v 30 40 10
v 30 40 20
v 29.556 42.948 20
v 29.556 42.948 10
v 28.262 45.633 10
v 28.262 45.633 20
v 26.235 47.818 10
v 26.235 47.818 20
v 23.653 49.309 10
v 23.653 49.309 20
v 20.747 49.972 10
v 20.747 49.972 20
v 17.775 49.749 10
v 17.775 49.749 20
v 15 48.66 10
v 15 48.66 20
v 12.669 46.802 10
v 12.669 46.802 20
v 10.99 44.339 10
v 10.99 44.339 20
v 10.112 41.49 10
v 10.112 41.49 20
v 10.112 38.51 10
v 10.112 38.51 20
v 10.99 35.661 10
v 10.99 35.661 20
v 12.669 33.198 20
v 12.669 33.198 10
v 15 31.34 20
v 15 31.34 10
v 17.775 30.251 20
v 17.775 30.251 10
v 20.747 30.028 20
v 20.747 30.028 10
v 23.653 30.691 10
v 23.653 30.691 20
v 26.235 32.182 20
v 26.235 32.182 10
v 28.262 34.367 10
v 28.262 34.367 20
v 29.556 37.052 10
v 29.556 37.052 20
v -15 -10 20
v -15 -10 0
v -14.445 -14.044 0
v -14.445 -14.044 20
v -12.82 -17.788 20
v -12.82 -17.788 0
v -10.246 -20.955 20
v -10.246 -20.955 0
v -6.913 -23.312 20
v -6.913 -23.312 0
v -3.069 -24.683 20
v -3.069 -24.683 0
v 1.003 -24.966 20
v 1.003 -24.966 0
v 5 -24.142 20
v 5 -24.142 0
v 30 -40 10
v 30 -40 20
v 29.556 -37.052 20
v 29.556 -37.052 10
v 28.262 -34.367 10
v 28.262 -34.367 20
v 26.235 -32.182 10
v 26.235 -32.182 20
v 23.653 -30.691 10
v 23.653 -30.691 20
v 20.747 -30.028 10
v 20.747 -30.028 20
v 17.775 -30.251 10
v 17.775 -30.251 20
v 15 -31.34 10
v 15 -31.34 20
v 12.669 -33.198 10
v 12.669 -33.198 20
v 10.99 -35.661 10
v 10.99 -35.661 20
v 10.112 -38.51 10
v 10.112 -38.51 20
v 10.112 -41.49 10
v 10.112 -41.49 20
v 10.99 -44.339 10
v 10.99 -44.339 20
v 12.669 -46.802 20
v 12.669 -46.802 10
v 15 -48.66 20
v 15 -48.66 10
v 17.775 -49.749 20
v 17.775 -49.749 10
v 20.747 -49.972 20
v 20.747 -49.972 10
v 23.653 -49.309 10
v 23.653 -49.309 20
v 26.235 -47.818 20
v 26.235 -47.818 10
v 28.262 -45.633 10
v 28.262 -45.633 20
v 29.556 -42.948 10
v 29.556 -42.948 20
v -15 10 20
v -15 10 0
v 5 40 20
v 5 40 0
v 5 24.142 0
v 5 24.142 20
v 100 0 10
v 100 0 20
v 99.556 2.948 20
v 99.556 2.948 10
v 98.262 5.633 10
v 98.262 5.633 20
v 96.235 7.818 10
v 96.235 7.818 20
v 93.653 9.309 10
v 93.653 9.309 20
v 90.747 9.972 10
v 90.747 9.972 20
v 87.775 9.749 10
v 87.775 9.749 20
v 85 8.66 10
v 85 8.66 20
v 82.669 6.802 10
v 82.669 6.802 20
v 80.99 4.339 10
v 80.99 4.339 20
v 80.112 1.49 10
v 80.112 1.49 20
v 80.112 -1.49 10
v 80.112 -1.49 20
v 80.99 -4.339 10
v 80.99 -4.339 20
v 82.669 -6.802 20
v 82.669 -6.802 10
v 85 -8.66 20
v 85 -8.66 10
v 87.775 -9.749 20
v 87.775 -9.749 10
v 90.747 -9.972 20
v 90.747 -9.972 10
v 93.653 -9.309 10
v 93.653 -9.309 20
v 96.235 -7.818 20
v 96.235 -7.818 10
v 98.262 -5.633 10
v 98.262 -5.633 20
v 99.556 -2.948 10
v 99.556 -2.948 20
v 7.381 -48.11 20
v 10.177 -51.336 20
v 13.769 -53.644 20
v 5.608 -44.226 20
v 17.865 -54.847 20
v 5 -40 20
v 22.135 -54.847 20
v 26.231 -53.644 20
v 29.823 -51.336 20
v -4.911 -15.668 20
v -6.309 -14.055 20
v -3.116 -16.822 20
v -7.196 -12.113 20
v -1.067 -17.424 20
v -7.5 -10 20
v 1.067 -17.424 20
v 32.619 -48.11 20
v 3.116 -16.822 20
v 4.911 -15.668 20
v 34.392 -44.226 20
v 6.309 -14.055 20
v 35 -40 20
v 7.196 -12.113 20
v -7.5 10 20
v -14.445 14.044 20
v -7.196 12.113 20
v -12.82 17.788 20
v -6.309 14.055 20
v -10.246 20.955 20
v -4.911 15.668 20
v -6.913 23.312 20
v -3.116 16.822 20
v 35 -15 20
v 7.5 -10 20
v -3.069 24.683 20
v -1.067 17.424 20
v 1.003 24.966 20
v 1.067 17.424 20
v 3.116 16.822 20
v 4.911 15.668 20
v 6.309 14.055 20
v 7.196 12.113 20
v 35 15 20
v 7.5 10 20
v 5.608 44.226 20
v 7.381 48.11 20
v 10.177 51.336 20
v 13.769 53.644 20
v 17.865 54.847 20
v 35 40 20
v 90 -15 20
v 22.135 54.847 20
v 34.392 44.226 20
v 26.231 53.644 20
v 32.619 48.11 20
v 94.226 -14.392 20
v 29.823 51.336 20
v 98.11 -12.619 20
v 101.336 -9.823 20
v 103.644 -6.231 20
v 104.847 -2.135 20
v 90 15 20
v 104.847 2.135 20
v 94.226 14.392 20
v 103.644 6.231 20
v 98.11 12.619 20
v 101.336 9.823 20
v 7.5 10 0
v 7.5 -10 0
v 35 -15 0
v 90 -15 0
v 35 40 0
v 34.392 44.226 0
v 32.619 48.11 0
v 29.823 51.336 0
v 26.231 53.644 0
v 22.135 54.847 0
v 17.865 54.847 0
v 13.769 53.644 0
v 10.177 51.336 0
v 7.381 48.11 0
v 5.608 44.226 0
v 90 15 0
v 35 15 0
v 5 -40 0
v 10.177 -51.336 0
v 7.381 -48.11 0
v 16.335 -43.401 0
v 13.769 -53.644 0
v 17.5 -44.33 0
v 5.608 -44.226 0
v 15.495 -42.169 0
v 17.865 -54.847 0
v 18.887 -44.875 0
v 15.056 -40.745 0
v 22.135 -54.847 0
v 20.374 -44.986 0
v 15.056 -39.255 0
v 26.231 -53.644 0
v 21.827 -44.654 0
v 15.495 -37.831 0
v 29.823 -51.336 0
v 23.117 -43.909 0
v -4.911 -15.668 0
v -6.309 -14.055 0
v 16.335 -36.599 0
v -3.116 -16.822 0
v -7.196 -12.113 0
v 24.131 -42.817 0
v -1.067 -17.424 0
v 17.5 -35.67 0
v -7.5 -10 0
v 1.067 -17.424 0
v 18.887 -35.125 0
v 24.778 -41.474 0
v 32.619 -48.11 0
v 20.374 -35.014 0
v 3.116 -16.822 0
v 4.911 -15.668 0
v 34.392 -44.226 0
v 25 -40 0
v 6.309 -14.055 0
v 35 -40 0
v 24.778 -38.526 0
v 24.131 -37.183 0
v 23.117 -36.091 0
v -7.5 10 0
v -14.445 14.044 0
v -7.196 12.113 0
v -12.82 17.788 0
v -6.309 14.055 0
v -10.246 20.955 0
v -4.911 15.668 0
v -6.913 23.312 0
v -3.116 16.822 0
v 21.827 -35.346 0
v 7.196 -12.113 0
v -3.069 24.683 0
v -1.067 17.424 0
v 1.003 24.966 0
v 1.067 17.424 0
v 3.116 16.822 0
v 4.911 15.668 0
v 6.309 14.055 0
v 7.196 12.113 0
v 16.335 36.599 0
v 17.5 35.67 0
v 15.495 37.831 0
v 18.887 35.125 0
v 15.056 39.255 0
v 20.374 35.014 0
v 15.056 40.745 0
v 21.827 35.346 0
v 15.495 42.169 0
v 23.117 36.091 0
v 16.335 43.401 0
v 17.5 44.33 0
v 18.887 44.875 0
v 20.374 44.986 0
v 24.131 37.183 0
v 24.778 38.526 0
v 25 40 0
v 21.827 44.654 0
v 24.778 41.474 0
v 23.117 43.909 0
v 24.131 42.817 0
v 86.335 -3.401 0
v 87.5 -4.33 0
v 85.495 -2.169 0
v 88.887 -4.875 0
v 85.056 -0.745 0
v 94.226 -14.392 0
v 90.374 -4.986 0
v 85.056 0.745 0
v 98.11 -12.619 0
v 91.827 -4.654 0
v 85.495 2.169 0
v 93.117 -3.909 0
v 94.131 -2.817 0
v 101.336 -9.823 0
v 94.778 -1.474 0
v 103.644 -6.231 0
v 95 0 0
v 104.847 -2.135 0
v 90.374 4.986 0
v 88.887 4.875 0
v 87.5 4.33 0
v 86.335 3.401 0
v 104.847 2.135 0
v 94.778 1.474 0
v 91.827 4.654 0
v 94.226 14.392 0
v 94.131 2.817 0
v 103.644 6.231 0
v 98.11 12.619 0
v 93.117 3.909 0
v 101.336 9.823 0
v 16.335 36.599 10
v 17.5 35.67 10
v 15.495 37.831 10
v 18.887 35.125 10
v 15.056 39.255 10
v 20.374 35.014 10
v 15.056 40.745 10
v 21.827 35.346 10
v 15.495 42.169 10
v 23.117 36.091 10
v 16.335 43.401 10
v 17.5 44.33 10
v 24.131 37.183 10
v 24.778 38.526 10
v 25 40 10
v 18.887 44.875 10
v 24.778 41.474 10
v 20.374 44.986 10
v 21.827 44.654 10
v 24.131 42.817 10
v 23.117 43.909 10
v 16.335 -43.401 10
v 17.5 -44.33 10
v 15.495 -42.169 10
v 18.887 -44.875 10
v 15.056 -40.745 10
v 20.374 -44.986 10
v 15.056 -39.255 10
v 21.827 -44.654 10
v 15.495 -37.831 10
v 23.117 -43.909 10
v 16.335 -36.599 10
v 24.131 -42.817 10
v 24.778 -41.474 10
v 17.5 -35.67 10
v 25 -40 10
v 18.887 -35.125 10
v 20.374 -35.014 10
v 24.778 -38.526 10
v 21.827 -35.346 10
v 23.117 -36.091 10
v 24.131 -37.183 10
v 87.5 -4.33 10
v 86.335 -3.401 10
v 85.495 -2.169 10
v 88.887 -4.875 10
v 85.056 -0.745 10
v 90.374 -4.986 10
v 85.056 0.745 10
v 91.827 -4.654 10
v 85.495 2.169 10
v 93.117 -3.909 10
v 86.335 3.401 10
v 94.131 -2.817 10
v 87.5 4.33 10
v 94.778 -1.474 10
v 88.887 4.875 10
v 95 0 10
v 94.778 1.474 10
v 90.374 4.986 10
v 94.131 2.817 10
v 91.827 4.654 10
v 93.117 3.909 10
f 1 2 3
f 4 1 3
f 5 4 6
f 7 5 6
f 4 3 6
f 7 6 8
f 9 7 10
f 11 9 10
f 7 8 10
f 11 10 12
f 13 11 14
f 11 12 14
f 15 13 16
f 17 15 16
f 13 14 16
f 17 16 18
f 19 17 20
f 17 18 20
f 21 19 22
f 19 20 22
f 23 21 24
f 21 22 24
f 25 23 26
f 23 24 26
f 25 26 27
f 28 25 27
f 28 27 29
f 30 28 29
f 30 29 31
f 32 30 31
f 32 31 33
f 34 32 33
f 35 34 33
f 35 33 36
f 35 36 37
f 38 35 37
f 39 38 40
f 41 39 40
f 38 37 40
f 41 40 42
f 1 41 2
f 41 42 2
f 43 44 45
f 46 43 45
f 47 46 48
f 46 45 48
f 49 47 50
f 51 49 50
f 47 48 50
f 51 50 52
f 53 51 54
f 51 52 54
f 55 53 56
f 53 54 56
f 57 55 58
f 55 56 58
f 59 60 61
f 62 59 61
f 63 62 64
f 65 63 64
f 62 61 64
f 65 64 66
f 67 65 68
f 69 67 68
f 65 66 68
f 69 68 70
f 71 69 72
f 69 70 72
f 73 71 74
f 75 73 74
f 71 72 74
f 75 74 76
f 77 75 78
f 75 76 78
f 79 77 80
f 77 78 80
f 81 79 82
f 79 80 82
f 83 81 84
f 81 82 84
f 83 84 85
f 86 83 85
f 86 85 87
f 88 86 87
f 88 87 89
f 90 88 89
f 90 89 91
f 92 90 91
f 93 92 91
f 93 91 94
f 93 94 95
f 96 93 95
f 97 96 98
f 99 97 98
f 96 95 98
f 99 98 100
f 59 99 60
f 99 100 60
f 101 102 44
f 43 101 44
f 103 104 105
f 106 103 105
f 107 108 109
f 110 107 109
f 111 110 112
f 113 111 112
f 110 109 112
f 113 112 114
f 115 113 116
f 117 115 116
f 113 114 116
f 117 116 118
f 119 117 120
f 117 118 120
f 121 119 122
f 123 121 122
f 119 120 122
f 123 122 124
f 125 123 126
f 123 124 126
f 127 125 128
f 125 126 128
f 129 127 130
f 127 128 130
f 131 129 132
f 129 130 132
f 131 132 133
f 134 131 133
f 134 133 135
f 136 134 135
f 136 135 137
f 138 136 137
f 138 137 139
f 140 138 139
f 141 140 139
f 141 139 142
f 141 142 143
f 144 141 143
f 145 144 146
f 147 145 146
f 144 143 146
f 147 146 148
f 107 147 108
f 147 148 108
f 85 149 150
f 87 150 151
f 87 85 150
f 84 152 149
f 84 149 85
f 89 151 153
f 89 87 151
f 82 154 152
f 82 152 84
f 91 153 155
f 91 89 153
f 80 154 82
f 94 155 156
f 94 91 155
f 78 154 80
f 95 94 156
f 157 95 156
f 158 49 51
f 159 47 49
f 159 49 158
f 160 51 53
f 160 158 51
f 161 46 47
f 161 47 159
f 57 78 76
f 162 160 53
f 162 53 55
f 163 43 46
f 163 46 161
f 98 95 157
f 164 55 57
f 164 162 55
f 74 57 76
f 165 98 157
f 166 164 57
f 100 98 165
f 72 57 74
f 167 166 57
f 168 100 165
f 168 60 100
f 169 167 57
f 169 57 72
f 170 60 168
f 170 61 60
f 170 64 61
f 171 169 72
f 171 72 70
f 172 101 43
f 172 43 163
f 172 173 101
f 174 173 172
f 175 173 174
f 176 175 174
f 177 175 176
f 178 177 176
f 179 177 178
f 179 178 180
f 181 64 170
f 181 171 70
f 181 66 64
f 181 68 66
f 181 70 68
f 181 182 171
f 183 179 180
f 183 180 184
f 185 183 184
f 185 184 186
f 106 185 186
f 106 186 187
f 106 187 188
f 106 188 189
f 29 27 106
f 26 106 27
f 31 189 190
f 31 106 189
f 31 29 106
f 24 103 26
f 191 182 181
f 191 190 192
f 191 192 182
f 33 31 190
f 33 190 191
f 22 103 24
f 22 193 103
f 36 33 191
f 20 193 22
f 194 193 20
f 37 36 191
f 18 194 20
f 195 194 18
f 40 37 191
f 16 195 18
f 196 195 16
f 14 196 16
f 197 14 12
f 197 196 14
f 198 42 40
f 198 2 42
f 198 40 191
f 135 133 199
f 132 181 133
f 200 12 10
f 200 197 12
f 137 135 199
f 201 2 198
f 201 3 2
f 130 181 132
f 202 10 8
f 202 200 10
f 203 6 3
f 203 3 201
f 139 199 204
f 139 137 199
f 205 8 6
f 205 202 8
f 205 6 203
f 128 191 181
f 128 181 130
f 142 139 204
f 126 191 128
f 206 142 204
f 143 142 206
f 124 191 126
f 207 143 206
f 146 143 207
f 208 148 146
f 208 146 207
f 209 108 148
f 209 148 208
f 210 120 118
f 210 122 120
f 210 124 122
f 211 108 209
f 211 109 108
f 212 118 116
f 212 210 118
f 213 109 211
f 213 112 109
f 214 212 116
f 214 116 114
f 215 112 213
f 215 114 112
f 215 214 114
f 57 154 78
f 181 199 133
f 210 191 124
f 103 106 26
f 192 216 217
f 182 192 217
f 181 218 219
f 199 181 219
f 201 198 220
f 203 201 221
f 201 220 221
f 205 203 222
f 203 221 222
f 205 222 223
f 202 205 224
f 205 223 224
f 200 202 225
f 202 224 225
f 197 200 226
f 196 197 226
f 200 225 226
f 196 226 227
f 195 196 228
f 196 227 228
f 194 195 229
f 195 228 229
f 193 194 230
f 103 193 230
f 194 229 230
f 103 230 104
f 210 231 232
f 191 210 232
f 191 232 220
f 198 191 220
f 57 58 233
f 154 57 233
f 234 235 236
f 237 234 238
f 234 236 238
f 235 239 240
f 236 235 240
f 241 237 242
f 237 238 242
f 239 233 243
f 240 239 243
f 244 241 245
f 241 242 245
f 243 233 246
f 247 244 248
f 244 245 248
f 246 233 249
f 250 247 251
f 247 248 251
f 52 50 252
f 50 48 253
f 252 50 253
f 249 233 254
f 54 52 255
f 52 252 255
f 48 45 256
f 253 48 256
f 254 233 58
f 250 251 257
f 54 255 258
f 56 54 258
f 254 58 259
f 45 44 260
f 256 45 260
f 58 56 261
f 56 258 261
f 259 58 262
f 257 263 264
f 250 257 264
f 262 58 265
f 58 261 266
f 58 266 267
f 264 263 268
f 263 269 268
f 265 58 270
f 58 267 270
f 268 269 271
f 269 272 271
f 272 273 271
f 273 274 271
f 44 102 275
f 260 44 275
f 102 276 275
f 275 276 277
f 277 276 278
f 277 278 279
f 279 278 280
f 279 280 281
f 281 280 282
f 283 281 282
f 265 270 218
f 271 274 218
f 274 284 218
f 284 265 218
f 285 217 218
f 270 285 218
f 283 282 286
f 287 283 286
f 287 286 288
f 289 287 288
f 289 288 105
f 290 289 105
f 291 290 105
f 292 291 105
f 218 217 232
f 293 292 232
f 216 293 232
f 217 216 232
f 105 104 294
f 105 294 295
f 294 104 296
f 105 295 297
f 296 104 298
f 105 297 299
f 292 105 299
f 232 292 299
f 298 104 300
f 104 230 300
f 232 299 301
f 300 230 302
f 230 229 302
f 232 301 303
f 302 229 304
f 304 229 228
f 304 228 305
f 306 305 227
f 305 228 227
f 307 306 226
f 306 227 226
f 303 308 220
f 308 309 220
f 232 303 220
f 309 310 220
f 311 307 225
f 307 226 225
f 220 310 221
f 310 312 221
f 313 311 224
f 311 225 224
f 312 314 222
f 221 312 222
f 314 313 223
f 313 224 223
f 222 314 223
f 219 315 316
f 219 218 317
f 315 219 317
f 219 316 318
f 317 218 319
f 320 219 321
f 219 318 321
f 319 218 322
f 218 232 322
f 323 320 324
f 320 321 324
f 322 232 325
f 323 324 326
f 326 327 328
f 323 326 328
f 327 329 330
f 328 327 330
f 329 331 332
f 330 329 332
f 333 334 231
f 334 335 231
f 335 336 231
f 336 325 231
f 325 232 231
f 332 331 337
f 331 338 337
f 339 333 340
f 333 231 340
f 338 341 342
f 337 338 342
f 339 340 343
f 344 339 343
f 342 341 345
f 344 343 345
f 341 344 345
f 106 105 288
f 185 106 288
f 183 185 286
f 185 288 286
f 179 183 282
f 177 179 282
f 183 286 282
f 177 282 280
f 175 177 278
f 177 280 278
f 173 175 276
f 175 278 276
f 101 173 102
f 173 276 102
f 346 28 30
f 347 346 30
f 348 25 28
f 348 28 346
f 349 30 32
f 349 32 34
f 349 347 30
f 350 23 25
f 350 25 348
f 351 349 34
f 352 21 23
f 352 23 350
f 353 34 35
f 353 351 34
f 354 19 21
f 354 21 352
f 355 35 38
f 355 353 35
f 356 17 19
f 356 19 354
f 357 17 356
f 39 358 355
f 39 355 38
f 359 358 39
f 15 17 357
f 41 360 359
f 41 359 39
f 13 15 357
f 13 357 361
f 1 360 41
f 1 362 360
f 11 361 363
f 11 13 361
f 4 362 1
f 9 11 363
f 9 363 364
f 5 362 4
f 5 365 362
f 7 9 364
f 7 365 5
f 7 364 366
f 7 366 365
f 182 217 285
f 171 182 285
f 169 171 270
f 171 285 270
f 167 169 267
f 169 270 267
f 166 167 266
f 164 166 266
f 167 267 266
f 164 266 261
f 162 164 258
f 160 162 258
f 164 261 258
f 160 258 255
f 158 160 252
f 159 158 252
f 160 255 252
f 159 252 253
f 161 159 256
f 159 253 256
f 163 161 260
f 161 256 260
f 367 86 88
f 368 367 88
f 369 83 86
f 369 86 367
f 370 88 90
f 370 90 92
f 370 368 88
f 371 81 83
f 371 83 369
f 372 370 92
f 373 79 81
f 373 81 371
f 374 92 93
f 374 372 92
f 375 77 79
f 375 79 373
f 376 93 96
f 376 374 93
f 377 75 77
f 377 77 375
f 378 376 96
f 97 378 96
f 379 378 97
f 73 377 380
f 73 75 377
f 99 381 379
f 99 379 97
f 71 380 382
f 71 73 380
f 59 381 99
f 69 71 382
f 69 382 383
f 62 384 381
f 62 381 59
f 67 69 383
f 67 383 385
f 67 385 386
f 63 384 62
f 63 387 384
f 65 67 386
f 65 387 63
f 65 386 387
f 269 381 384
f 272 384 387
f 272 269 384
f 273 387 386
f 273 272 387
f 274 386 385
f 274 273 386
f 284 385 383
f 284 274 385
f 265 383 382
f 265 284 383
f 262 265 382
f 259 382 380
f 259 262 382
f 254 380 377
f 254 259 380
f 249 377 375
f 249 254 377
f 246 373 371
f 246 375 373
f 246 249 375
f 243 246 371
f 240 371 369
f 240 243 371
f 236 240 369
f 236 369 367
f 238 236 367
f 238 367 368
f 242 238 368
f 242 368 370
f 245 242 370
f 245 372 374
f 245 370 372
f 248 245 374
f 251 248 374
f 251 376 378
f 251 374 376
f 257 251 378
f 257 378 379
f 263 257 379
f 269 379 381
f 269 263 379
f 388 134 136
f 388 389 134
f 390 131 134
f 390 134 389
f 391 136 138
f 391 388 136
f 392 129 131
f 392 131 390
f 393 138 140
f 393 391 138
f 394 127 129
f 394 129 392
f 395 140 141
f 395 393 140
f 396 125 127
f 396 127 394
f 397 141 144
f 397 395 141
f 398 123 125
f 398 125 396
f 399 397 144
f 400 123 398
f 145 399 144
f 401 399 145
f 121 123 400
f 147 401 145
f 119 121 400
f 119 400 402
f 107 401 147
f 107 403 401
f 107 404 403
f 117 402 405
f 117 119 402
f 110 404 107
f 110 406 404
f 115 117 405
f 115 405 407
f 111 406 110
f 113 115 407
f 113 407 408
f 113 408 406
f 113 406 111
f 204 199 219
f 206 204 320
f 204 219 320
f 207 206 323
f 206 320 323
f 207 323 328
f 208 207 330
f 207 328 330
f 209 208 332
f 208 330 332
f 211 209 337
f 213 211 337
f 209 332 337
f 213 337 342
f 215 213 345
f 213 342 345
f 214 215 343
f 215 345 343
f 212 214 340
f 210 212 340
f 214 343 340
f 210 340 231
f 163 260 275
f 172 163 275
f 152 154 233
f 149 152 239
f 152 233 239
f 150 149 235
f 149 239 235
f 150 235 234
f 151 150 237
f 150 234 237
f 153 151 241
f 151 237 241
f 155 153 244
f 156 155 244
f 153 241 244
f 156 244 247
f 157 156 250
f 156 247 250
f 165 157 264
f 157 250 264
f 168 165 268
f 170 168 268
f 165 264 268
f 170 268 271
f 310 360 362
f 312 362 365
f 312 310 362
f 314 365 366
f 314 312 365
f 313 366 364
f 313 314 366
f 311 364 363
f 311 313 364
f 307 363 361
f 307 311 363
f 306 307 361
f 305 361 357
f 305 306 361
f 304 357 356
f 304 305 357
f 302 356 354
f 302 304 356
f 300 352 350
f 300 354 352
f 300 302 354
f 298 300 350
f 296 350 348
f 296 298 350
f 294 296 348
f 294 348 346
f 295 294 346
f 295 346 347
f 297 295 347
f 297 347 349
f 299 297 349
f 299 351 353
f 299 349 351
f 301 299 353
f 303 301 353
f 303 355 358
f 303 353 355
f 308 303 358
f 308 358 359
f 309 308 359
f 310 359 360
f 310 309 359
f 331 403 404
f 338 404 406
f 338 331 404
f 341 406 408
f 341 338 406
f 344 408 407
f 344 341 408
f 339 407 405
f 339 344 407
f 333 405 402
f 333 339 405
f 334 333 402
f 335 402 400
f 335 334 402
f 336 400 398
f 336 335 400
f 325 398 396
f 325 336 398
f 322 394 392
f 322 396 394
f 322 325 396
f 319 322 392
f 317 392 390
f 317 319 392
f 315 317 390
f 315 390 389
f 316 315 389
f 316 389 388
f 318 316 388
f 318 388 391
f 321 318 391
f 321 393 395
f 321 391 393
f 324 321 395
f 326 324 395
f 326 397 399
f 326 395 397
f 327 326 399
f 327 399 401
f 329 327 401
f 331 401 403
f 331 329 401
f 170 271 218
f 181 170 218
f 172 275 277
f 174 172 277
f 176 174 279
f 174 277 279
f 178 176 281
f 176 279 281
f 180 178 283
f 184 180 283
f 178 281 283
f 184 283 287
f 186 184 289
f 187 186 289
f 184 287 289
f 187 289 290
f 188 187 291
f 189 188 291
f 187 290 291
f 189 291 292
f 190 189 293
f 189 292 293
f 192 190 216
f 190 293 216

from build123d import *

# Parameters (mm, degrees)
SKETCH1_R           = 5
BOSS_EXTRUDE1_DEPTH = 20
SKETCH2_R           = 10
CUT_EXTRUDE1_DEPTH  = 10


with BuildPart() as part:
    # Sketch1 → Boss-Extrude1 (new body)
    with BuildSketch(Plane.XY):
        with BuildLine():
            Line((-15, 10), (-15, -10))
            ThreePointArc((-15, -10), (-8.660254038, -22.247448714), (5, -24.142135624))
            Line((5, -24.142135624), (5, -40))
            ThreePointArc((5, -40), (20, -55), (35, -40))
            Line((35, -40), (35, -15))
            Line((35, -15), (90, -15))
            ThreePointArc((90, -15), (105, 0), (90, 15))
            Line((90, 15), (35, 15))
            Line((35, 15), (35, 40))
            ThreePointArc((35, 40), (20, 55), (5, 40))
            Line((5, 40), (5, 24.142135624))
            ThreePointArc((5, 24.142135624), (-8.660254038, 22.247448714), (-15, 10))
        make_face()
        with Locations((20, 40)):
            Circle(SKETCH1_R, mode=Mode.SUBTRACT)
        with Locations((20, -40)):
            Circle(SKETCH1_R, mode=Mode.SUBTRACT)
        with Locations((90, 0)):
            Circle(SKETCH1_R, mode=Mode.SUBTRACT)
        with BuildLine():
            Line((7.5, 10), (7.5, -10))
            ThreePointArc((7.5, -10), (0, -17.5), (-7.5, -10))
            Line((-7.5, -10), (-7.5, 10))
            ThreePointArc((-7.5, 10), (0, 17.5), (7.5, 10))
        make_face(mode=Mode.SUBTRACT)
    extrude(amount=BOSS_EXTRUDE1_DEPTH)

    # Sketch2 → Cut-Extrude1 (cut)
    with BuildSketch(Plane.XY.offset(20)):
        with Locations((20, 40)):
            Circle(SKETCH2_R)
        with Locations((20, -40)):
            Circle(SKETCH2_R)
        with Locations((90, 0)):
            Circle(SKETCH2_R)
    extrude(amount=-CUT_EXTRUDE1_DEPTH, mode=Mode.SUBTRACT)


solid = part.part
